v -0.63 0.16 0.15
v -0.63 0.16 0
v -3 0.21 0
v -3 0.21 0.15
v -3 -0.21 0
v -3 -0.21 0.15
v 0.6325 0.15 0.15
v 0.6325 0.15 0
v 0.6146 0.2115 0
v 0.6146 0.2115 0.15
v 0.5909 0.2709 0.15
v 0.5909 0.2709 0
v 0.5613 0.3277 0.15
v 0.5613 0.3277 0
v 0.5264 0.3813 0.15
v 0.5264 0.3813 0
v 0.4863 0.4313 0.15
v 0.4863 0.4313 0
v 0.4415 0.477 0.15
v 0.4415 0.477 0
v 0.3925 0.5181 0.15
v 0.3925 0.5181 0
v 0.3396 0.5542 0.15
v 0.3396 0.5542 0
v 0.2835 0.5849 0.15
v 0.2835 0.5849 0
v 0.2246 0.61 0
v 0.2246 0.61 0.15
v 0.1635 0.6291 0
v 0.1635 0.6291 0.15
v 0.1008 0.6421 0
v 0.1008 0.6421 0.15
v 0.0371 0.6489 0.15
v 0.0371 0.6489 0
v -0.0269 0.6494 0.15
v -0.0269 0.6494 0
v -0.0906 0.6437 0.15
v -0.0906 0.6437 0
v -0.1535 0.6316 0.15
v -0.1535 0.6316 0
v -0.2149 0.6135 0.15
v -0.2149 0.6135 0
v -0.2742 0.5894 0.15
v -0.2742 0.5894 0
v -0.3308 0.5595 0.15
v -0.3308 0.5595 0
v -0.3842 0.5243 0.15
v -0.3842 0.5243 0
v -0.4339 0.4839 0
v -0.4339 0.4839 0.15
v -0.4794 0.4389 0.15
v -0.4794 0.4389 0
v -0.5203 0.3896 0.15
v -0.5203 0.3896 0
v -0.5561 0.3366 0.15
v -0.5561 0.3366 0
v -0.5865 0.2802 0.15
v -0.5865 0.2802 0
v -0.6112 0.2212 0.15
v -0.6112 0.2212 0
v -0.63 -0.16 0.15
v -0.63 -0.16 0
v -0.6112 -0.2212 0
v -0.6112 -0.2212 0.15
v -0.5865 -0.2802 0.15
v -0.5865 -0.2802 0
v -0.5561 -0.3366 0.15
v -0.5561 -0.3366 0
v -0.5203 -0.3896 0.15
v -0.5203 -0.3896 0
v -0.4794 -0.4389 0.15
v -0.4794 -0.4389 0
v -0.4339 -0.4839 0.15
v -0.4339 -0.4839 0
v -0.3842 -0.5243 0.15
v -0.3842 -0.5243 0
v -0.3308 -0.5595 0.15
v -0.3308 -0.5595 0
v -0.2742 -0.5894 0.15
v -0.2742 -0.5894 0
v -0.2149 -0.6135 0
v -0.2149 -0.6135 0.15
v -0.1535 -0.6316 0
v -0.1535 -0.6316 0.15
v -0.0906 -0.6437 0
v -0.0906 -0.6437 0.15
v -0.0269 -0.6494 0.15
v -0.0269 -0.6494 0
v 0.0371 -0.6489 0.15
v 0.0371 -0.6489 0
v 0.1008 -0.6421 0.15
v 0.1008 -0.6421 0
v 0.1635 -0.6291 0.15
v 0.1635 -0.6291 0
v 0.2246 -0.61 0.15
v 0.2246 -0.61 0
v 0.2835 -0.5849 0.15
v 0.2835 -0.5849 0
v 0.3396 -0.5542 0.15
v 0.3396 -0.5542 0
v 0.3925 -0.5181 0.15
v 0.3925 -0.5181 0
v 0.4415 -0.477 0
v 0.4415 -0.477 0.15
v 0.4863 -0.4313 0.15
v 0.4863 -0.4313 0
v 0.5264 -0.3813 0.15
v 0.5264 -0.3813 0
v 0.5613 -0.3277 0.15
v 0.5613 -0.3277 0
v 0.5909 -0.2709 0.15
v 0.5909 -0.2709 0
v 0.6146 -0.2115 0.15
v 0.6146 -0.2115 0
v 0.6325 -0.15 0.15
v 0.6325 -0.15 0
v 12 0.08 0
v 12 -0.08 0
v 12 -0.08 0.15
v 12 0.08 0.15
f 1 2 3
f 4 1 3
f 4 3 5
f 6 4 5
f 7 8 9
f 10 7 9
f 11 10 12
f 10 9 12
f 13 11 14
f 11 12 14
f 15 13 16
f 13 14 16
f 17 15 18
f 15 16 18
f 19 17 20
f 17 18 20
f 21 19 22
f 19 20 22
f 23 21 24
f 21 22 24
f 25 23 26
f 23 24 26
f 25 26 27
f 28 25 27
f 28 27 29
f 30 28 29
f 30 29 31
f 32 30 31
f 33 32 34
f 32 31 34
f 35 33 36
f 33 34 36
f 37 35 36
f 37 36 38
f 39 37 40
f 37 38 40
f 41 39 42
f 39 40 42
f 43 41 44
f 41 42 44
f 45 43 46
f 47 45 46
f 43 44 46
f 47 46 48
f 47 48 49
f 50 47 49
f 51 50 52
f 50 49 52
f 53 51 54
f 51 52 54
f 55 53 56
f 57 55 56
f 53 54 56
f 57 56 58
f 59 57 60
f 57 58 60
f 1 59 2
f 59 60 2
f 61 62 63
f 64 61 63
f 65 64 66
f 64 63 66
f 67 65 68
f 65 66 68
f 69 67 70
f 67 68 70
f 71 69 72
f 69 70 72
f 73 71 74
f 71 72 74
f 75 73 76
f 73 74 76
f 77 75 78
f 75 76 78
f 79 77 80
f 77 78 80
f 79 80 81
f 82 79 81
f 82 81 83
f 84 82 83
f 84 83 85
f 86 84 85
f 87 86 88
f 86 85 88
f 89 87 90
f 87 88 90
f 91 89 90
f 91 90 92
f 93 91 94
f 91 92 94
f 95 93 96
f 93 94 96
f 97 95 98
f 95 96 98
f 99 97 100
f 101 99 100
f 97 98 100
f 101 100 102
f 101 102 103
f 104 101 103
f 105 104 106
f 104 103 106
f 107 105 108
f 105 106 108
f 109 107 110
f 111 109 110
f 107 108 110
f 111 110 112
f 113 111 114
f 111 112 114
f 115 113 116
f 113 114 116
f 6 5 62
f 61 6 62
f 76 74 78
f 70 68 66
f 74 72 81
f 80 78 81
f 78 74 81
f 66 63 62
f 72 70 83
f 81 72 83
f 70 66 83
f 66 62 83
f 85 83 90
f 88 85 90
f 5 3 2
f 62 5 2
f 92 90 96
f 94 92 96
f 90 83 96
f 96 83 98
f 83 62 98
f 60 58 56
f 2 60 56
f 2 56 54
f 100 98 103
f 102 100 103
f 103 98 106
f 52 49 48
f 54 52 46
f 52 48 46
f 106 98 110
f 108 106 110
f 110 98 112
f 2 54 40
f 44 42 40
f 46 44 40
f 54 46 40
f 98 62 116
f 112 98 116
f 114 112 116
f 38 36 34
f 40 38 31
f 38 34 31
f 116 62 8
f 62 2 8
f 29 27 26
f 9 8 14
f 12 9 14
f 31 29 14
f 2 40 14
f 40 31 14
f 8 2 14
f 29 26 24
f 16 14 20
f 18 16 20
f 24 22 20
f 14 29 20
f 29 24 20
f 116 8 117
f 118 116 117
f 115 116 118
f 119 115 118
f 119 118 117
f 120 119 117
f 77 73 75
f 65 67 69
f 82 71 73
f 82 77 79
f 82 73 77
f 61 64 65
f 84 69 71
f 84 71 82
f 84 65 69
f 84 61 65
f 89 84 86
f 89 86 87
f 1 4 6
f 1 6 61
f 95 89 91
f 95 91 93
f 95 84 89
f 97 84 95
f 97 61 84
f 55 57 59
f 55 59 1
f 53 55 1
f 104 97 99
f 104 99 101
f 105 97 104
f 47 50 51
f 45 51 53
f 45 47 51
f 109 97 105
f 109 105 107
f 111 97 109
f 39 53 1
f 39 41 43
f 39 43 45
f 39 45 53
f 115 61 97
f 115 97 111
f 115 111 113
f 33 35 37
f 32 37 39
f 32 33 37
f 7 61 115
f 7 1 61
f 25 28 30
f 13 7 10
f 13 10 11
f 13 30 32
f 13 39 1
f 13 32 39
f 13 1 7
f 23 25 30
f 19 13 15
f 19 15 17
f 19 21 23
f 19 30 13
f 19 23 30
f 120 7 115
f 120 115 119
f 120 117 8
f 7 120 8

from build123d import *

# Parameters (mm, degrees)
F1_DEPTH = 0.15


with BuildPart() as f1:
    # F0 (on Top) → F1 (new body)
    with BuildSketch(Plane.XY):
        with BuildLine():
            Line((12, 0.08), (0.632456, 0.15))
            ThreePointArc((0.632456, 0.15), (0.005149, 0.64998), (-0.63, 0.16))
            Line((-0.63, 0.16), (-3, 0.21))
            Line((-3, 0.21), (-3, 0))
            Line((-3, 0), (-3, -0.21))
            Line((-3, -0.21), (-0.63, -0.16))
            ThreePointArc((-0.63, -0.16), (0.005149, -0.64998), (0.632456, -0.15))
            Line((0.632456, -0.15), (12, -0.08))
            Line((12, -0.08), (12, 0))
            Line((12, 0), (12, 0.08))
        make_face()
    extrude(amount=F1_DEPTH)


solid = f1.part
